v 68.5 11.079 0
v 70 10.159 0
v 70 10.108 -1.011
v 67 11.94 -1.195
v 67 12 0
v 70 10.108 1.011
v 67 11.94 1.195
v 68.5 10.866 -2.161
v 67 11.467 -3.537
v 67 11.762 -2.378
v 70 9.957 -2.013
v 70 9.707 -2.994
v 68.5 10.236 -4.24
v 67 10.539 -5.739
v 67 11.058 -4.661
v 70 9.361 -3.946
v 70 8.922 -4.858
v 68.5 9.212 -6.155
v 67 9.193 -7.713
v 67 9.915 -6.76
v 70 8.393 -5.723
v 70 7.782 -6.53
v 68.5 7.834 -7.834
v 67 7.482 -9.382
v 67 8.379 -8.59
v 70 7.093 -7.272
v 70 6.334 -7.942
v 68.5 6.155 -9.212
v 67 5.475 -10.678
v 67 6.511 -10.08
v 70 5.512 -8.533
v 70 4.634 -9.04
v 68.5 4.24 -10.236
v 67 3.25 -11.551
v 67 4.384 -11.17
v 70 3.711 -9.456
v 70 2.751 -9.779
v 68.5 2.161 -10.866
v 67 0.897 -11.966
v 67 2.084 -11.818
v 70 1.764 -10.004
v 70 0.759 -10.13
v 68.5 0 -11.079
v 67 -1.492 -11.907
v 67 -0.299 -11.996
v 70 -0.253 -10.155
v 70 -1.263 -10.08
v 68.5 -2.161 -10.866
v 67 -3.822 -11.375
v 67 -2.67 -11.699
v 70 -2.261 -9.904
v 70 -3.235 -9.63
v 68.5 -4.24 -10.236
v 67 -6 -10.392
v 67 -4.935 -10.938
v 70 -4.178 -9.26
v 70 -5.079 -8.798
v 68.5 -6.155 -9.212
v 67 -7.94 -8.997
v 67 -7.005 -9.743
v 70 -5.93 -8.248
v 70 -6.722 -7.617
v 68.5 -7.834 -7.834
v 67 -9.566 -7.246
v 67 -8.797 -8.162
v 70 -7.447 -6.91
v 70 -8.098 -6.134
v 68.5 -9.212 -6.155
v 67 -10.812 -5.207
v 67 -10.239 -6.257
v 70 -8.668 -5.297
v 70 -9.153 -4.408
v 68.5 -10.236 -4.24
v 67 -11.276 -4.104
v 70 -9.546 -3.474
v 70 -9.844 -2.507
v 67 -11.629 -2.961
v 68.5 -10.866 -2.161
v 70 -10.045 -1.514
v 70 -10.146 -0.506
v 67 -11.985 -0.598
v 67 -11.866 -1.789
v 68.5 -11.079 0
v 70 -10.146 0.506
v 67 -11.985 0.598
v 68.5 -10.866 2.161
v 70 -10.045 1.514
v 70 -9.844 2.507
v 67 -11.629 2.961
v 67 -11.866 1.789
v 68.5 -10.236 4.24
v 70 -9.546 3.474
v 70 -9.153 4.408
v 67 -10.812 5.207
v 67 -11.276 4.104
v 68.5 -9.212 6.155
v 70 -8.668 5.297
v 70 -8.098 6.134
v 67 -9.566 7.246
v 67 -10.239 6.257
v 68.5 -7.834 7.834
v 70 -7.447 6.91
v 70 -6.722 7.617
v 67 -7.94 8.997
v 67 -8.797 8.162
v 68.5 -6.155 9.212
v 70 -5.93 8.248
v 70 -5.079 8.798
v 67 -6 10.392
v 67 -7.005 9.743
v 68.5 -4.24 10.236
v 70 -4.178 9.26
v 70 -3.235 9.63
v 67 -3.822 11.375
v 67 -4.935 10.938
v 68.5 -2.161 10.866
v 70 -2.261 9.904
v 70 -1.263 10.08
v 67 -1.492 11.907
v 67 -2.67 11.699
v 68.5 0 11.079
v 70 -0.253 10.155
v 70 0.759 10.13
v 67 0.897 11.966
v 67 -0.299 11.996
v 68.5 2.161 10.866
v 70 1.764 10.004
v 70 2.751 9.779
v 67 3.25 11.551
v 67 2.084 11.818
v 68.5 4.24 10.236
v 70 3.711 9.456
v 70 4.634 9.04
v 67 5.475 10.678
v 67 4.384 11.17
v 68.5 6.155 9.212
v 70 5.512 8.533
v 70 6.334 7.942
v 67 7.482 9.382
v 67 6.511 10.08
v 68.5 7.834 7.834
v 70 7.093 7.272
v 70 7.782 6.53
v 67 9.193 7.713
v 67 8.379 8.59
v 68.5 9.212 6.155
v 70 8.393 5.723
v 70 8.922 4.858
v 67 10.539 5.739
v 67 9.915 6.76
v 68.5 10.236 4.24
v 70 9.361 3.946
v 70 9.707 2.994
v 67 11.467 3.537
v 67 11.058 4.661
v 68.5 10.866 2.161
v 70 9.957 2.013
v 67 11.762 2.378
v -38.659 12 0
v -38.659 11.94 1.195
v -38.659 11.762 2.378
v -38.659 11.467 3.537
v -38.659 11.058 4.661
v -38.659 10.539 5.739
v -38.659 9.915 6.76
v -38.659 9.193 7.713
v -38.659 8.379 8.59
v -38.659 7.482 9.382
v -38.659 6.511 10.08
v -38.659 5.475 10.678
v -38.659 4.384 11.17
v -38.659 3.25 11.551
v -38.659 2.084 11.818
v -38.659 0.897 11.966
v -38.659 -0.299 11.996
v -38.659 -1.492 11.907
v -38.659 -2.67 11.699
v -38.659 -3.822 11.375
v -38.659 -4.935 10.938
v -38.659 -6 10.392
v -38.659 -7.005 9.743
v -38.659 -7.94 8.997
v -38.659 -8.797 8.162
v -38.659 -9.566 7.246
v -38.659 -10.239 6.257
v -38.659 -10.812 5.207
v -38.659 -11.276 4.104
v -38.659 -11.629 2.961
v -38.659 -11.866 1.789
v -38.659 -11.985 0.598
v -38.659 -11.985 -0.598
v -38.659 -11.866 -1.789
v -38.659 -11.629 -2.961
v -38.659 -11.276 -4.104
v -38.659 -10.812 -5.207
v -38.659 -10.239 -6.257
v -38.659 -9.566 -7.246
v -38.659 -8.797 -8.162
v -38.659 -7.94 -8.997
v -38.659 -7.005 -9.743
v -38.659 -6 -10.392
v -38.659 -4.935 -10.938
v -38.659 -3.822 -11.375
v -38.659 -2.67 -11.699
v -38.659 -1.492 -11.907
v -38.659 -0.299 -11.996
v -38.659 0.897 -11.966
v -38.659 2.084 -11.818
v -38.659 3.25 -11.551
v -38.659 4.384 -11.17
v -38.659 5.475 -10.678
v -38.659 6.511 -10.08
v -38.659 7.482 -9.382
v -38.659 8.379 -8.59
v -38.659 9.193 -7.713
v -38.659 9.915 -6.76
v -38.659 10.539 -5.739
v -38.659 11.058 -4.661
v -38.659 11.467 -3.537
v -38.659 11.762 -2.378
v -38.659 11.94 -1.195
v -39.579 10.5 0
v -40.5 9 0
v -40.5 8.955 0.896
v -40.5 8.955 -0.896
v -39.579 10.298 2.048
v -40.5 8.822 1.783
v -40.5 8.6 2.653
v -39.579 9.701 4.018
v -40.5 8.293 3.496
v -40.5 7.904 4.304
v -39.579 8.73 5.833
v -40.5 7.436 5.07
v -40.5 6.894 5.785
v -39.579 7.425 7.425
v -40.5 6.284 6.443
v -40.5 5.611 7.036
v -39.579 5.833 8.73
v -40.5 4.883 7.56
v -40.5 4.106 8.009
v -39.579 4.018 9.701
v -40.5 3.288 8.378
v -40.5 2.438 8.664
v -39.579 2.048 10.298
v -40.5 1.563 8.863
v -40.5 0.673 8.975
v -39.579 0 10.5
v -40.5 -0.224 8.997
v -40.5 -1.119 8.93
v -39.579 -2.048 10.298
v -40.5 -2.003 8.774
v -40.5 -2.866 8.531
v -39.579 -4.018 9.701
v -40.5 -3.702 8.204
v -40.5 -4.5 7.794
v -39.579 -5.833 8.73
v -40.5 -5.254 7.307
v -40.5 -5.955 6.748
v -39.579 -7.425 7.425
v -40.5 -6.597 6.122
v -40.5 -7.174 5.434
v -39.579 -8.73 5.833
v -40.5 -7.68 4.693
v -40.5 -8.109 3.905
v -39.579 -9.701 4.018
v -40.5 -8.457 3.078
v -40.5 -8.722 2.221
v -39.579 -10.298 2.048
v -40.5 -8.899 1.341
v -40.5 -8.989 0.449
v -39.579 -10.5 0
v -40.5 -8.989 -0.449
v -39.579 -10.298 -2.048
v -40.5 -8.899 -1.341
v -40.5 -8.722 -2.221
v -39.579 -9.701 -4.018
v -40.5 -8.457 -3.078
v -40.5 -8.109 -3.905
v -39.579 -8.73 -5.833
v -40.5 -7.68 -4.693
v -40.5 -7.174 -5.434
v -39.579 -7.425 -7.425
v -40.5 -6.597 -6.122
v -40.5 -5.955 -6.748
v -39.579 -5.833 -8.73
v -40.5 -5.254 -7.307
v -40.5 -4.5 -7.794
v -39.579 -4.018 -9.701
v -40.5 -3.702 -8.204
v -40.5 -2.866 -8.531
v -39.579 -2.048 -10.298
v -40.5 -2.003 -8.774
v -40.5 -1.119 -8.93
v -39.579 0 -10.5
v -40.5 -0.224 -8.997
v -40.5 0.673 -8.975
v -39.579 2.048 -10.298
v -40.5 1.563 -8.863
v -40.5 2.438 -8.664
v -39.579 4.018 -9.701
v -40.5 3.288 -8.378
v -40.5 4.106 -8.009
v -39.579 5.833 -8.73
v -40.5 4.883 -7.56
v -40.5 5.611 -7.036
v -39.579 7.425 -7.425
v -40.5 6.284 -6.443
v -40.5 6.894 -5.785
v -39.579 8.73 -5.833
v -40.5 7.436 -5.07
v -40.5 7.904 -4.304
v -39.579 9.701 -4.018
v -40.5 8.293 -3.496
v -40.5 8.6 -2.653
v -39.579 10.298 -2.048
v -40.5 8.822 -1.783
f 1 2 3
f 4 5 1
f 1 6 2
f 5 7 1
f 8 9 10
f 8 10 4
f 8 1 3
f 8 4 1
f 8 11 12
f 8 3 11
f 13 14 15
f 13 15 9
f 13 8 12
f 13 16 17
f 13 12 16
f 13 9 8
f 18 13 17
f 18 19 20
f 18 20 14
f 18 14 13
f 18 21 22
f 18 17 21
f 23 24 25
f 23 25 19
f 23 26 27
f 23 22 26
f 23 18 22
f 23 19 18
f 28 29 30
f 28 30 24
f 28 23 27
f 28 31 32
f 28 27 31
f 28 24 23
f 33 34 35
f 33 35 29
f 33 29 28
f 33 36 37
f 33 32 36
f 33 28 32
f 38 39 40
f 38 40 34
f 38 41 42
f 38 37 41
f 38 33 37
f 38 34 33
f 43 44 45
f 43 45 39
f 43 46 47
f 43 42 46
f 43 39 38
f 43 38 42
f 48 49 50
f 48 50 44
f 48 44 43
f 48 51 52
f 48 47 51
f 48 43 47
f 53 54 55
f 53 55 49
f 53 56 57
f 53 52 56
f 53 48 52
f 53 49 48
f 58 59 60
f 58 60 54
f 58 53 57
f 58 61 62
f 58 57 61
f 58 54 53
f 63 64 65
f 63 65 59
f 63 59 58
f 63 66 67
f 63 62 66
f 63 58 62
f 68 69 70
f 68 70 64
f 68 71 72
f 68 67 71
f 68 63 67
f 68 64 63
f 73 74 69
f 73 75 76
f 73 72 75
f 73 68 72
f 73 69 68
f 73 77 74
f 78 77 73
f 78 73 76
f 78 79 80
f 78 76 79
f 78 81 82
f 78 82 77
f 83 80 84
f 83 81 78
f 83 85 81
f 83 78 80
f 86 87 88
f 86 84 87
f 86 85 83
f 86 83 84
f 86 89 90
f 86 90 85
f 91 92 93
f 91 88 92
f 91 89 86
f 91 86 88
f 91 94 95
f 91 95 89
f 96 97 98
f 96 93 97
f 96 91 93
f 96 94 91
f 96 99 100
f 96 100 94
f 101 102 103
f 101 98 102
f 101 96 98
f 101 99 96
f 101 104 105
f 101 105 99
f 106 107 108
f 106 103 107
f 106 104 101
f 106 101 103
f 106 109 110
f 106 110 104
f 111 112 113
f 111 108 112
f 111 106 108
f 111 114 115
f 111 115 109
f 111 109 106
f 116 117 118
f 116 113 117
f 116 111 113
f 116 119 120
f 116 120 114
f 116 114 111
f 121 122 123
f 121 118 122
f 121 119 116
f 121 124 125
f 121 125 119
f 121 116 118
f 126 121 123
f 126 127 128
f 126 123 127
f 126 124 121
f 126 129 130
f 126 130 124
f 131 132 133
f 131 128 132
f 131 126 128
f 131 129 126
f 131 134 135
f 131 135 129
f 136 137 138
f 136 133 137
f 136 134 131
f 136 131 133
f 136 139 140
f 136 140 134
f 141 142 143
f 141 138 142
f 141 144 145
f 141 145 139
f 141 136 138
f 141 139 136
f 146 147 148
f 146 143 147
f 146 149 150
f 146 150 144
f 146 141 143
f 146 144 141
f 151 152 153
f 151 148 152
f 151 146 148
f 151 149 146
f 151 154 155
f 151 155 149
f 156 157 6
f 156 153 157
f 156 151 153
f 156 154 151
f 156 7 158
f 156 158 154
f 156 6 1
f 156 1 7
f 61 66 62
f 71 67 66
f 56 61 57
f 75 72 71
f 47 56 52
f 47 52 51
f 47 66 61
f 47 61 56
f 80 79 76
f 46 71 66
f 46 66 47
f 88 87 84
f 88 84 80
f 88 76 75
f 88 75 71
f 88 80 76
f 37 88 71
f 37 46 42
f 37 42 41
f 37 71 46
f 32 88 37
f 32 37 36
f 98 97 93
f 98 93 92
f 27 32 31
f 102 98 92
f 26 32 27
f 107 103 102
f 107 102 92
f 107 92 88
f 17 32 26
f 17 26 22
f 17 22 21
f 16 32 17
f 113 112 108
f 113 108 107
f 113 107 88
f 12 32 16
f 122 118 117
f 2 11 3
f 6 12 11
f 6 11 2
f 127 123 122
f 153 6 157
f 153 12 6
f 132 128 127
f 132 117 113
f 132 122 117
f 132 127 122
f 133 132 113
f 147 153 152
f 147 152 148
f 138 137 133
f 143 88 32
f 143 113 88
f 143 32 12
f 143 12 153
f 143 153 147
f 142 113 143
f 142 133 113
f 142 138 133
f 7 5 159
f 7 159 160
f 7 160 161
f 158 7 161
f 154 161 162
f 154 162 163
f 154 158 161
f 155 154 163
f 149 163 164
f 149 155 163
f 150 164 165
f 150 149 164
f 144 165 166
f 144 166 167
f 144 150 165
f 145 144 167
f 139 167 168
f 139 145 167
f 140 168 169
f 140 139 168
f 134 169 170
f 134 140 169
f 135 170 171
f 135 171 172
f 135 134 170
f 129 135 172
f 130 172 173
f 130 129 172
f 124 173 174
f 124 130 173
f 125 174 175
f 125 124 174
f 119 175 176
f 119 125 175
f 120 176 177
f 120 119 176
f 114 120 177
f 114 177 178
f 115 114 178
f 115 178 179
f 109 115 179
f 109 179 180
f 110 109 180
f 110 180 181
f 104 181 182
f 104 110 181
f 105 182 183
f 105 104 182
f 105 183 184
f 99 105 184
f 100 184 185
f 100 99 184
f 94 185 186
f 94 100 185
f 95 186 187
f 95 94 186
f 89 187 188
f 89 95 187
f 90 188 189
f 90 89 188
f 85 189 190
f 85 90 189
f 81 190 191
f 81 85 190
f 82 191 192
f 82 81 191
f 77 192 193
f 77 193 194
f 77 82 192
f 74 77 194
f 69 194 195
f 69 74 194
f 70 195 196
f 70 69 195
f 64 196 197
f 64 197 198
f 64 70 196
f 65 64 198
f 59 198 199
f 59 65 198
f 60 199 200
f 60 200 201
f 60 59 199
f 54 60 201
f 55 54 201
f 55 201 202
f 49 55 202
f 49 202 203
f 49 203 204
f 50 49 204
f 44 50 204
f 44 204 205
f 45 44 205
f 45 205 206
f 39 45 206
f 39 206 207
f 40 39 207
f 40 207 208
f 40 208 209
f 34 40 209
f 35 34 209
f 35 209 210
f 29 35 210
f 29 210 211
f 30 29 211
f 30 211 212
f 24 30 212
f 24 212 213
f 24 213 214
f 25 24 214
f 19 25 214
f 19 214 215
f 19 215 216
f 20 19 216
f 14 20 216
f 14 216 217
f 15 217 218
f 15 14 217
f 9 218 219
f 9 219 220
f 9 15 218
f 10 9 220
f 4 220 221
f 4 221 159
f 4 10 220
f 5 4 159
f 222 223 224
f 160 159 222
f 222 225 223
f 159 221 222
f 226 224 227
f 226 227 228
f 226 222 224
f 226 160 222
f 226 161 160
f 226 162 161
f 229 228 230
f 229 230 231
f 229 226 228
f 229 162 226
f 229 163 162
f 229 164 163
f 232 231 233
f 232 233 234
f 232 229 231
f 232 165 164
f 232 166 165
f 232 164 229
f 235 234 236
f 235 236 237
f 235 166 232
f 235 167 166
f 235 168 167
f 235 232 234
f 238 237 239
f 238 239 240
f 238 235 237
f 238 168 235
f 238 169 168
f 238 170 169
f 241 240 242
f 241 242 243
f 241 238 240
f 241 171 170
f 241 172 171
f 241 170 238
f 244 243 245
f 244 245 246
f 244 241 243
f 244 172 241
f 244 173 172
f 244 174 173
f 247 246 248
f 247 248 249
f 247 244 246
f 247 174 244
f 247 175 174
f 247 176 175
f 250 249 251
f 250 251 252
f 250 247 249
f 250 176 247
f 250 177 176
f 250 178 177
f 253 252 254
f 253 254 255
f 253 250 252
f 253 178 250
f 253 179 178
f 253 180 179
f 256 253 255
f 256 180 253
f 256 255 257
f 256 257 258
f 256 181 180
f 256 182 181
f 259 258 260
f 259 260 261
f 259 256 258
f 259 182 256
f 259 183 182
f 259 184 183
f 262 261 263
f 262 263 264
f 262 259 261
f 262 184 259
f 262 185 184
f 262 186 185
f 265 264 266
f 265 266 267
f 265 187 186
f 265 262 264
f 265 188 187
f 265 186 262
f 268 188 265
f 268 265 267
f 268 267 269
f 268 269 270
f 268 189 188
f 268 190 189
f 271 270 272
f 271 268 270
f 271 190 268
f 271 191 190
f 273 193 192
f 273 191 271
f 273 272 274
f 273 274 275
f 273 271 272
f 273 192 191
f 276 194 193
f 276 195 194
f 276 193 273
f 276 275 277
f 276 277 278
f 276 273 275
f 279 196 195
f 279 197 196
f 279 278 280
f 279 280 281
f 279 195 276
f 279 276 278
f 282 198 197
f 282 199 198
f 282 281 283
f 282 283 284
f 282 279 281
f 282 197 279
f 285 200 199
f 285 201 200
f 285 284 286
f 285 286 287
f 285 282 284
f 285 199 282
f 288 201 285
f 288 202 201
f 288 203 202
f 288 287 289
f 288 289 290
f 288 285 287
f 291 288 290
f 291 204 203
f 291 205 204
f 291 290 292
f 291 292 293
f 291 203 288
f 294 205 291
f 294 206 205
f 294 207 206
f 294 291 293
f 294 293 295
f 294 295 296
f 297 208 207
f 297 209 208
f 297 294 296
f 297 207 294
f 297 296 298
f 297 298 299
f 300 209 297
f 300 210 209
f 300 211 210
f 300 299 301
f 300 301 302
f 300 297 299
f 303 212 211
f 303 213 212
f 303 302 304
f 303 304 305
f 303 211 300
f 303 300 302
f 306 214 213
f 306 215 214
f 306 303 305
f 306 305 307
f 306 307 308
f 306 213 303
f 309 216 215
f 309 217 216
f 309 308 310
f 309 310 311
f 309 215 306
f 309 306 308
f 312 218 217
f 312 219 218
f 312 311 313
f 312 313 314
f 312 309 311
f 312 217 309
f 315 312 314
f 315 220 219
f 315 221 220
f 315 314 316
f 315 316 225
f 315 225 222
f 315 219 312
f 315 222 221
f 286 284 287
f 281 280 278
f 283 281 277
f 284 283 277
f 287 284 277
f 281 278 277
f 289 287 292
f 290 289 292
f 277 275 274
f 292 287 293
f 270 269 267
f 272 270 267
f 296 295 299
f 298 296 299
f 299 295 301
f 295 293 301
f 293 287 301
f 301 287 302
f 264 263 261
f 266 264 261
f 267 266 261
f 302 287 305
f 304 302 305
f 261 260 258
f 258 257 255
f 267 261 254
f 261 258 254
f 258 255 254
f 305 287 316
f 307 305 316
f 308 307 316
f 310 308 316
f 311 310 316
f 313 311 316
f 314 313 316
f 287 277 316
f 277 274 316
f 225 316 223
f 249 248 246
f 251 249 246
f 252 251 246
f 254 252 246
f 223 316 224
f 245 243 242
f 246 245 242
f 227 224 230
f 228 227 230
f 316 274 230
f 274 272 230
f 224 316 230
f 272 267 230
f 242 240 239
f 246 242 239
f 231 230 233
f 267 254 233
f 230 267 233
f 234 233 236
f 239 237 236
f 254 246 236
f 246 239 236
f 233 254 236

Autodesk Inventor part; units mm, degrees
ref_plane "YZ Plane" through (0, 0, 0) normal (1, 0, 0) x (0, 1, 0)
ref_plane "XZ Plane" through (0, 0, 0) normal (0, 1, 0) x (-1, 0, 0)
sketch "Skizze1" plane through (0, 0, 0) normal (0, 0, 1) x (1, 0, 0)
  line L0 (70, 12) -> (70, 0)
  line L1 (-40.5, 0) -> (70, 0)
  line L2 (-62.6, 0) -> (92.1, 0) projected
  line L3 (0, 14.4) -> (0, -2.4) projected
  line L4 (-40.5, 12) -> (-40.5, 0)
  line L5 (16, 12) -> (16, 0) construction
  line L6 (-62.6, 0) -> (92.1, 0) projected
  line L7 (-40.5, 12) -> (70, 12)
  dimension "d4" = 40.5
  dimension "d5" = 70
  dimension "d6" = 54
  dimension "d13" = 24
revolve "Körper" add sketch "Skizze1" angle 360 about axis through (-40.5, 0, 0) along (1, 0, 0)
thread "Gewinde1" size "M24x3" class "6g" standard "ISO Metric profile" length 40.5
thread "Gewinde2" size "M24x3" class "6g" standard "ISO Metric profile" length 55.8404
chamfer "Fase1" distance 1.8414 distance2 3 1 edges at (70, -12, 0) measured on face at (70, 0.4821, 1.3341)
chamfer "Fase2" distance 1.8414 distance2 3 1 edges at (-40.5, -12, 0) measured on face at (31.1667, 11.9611, -0.9656)
ref_plane "Work Plane1" through (2.75, 0, 0) normal (0, -1, 0) x (1, 0, 0)
equation "\"d4\" = KOH"
equation "\"d5\" = NLG"
equation "\"d6\" = GEL"
equation "\"d13\" = GD"
equation "\"d1\" = KOH"
equation "\"d7\" = GEL + GAL"
equation "\"d10\" = -0.5 * SPD + 0.5 * GD"
equation "\"d12\" = -0.5 * SPD + 0.5 * GD"
equation "\"NLG\" = 70"
equation "\"GEL\" = 54"
equation "\"GAL\" = 0.61345 * PTC"
equation "\"SPD\" = 18"
equation "\"d0\" = GD"
equation "\"GUL\" = 0.61345 * PTC"
equation "\"KOH\" = 40.5"
equation "\"GD\" = 24"
equation "\"BDM\" = NND"
equation "\"GUL1\" = GUL"
equation "\"GAL1\" = GAL"
equation "\"d80\" = -GUL - GEL"
equation "\"d86\" = -KOH + GUL1"
equation "\"PTC\" = 3"
equation "\"THREADDIA\" = 24"
equation "\"TOA\" = 30deg"
equation "\"NND\" = 24"
equation "\"GD1\" = THREADDIA - 1.2269 * PTC"
properties part number "DIN 835 - M24 x 70" material "Stahl, weich"
